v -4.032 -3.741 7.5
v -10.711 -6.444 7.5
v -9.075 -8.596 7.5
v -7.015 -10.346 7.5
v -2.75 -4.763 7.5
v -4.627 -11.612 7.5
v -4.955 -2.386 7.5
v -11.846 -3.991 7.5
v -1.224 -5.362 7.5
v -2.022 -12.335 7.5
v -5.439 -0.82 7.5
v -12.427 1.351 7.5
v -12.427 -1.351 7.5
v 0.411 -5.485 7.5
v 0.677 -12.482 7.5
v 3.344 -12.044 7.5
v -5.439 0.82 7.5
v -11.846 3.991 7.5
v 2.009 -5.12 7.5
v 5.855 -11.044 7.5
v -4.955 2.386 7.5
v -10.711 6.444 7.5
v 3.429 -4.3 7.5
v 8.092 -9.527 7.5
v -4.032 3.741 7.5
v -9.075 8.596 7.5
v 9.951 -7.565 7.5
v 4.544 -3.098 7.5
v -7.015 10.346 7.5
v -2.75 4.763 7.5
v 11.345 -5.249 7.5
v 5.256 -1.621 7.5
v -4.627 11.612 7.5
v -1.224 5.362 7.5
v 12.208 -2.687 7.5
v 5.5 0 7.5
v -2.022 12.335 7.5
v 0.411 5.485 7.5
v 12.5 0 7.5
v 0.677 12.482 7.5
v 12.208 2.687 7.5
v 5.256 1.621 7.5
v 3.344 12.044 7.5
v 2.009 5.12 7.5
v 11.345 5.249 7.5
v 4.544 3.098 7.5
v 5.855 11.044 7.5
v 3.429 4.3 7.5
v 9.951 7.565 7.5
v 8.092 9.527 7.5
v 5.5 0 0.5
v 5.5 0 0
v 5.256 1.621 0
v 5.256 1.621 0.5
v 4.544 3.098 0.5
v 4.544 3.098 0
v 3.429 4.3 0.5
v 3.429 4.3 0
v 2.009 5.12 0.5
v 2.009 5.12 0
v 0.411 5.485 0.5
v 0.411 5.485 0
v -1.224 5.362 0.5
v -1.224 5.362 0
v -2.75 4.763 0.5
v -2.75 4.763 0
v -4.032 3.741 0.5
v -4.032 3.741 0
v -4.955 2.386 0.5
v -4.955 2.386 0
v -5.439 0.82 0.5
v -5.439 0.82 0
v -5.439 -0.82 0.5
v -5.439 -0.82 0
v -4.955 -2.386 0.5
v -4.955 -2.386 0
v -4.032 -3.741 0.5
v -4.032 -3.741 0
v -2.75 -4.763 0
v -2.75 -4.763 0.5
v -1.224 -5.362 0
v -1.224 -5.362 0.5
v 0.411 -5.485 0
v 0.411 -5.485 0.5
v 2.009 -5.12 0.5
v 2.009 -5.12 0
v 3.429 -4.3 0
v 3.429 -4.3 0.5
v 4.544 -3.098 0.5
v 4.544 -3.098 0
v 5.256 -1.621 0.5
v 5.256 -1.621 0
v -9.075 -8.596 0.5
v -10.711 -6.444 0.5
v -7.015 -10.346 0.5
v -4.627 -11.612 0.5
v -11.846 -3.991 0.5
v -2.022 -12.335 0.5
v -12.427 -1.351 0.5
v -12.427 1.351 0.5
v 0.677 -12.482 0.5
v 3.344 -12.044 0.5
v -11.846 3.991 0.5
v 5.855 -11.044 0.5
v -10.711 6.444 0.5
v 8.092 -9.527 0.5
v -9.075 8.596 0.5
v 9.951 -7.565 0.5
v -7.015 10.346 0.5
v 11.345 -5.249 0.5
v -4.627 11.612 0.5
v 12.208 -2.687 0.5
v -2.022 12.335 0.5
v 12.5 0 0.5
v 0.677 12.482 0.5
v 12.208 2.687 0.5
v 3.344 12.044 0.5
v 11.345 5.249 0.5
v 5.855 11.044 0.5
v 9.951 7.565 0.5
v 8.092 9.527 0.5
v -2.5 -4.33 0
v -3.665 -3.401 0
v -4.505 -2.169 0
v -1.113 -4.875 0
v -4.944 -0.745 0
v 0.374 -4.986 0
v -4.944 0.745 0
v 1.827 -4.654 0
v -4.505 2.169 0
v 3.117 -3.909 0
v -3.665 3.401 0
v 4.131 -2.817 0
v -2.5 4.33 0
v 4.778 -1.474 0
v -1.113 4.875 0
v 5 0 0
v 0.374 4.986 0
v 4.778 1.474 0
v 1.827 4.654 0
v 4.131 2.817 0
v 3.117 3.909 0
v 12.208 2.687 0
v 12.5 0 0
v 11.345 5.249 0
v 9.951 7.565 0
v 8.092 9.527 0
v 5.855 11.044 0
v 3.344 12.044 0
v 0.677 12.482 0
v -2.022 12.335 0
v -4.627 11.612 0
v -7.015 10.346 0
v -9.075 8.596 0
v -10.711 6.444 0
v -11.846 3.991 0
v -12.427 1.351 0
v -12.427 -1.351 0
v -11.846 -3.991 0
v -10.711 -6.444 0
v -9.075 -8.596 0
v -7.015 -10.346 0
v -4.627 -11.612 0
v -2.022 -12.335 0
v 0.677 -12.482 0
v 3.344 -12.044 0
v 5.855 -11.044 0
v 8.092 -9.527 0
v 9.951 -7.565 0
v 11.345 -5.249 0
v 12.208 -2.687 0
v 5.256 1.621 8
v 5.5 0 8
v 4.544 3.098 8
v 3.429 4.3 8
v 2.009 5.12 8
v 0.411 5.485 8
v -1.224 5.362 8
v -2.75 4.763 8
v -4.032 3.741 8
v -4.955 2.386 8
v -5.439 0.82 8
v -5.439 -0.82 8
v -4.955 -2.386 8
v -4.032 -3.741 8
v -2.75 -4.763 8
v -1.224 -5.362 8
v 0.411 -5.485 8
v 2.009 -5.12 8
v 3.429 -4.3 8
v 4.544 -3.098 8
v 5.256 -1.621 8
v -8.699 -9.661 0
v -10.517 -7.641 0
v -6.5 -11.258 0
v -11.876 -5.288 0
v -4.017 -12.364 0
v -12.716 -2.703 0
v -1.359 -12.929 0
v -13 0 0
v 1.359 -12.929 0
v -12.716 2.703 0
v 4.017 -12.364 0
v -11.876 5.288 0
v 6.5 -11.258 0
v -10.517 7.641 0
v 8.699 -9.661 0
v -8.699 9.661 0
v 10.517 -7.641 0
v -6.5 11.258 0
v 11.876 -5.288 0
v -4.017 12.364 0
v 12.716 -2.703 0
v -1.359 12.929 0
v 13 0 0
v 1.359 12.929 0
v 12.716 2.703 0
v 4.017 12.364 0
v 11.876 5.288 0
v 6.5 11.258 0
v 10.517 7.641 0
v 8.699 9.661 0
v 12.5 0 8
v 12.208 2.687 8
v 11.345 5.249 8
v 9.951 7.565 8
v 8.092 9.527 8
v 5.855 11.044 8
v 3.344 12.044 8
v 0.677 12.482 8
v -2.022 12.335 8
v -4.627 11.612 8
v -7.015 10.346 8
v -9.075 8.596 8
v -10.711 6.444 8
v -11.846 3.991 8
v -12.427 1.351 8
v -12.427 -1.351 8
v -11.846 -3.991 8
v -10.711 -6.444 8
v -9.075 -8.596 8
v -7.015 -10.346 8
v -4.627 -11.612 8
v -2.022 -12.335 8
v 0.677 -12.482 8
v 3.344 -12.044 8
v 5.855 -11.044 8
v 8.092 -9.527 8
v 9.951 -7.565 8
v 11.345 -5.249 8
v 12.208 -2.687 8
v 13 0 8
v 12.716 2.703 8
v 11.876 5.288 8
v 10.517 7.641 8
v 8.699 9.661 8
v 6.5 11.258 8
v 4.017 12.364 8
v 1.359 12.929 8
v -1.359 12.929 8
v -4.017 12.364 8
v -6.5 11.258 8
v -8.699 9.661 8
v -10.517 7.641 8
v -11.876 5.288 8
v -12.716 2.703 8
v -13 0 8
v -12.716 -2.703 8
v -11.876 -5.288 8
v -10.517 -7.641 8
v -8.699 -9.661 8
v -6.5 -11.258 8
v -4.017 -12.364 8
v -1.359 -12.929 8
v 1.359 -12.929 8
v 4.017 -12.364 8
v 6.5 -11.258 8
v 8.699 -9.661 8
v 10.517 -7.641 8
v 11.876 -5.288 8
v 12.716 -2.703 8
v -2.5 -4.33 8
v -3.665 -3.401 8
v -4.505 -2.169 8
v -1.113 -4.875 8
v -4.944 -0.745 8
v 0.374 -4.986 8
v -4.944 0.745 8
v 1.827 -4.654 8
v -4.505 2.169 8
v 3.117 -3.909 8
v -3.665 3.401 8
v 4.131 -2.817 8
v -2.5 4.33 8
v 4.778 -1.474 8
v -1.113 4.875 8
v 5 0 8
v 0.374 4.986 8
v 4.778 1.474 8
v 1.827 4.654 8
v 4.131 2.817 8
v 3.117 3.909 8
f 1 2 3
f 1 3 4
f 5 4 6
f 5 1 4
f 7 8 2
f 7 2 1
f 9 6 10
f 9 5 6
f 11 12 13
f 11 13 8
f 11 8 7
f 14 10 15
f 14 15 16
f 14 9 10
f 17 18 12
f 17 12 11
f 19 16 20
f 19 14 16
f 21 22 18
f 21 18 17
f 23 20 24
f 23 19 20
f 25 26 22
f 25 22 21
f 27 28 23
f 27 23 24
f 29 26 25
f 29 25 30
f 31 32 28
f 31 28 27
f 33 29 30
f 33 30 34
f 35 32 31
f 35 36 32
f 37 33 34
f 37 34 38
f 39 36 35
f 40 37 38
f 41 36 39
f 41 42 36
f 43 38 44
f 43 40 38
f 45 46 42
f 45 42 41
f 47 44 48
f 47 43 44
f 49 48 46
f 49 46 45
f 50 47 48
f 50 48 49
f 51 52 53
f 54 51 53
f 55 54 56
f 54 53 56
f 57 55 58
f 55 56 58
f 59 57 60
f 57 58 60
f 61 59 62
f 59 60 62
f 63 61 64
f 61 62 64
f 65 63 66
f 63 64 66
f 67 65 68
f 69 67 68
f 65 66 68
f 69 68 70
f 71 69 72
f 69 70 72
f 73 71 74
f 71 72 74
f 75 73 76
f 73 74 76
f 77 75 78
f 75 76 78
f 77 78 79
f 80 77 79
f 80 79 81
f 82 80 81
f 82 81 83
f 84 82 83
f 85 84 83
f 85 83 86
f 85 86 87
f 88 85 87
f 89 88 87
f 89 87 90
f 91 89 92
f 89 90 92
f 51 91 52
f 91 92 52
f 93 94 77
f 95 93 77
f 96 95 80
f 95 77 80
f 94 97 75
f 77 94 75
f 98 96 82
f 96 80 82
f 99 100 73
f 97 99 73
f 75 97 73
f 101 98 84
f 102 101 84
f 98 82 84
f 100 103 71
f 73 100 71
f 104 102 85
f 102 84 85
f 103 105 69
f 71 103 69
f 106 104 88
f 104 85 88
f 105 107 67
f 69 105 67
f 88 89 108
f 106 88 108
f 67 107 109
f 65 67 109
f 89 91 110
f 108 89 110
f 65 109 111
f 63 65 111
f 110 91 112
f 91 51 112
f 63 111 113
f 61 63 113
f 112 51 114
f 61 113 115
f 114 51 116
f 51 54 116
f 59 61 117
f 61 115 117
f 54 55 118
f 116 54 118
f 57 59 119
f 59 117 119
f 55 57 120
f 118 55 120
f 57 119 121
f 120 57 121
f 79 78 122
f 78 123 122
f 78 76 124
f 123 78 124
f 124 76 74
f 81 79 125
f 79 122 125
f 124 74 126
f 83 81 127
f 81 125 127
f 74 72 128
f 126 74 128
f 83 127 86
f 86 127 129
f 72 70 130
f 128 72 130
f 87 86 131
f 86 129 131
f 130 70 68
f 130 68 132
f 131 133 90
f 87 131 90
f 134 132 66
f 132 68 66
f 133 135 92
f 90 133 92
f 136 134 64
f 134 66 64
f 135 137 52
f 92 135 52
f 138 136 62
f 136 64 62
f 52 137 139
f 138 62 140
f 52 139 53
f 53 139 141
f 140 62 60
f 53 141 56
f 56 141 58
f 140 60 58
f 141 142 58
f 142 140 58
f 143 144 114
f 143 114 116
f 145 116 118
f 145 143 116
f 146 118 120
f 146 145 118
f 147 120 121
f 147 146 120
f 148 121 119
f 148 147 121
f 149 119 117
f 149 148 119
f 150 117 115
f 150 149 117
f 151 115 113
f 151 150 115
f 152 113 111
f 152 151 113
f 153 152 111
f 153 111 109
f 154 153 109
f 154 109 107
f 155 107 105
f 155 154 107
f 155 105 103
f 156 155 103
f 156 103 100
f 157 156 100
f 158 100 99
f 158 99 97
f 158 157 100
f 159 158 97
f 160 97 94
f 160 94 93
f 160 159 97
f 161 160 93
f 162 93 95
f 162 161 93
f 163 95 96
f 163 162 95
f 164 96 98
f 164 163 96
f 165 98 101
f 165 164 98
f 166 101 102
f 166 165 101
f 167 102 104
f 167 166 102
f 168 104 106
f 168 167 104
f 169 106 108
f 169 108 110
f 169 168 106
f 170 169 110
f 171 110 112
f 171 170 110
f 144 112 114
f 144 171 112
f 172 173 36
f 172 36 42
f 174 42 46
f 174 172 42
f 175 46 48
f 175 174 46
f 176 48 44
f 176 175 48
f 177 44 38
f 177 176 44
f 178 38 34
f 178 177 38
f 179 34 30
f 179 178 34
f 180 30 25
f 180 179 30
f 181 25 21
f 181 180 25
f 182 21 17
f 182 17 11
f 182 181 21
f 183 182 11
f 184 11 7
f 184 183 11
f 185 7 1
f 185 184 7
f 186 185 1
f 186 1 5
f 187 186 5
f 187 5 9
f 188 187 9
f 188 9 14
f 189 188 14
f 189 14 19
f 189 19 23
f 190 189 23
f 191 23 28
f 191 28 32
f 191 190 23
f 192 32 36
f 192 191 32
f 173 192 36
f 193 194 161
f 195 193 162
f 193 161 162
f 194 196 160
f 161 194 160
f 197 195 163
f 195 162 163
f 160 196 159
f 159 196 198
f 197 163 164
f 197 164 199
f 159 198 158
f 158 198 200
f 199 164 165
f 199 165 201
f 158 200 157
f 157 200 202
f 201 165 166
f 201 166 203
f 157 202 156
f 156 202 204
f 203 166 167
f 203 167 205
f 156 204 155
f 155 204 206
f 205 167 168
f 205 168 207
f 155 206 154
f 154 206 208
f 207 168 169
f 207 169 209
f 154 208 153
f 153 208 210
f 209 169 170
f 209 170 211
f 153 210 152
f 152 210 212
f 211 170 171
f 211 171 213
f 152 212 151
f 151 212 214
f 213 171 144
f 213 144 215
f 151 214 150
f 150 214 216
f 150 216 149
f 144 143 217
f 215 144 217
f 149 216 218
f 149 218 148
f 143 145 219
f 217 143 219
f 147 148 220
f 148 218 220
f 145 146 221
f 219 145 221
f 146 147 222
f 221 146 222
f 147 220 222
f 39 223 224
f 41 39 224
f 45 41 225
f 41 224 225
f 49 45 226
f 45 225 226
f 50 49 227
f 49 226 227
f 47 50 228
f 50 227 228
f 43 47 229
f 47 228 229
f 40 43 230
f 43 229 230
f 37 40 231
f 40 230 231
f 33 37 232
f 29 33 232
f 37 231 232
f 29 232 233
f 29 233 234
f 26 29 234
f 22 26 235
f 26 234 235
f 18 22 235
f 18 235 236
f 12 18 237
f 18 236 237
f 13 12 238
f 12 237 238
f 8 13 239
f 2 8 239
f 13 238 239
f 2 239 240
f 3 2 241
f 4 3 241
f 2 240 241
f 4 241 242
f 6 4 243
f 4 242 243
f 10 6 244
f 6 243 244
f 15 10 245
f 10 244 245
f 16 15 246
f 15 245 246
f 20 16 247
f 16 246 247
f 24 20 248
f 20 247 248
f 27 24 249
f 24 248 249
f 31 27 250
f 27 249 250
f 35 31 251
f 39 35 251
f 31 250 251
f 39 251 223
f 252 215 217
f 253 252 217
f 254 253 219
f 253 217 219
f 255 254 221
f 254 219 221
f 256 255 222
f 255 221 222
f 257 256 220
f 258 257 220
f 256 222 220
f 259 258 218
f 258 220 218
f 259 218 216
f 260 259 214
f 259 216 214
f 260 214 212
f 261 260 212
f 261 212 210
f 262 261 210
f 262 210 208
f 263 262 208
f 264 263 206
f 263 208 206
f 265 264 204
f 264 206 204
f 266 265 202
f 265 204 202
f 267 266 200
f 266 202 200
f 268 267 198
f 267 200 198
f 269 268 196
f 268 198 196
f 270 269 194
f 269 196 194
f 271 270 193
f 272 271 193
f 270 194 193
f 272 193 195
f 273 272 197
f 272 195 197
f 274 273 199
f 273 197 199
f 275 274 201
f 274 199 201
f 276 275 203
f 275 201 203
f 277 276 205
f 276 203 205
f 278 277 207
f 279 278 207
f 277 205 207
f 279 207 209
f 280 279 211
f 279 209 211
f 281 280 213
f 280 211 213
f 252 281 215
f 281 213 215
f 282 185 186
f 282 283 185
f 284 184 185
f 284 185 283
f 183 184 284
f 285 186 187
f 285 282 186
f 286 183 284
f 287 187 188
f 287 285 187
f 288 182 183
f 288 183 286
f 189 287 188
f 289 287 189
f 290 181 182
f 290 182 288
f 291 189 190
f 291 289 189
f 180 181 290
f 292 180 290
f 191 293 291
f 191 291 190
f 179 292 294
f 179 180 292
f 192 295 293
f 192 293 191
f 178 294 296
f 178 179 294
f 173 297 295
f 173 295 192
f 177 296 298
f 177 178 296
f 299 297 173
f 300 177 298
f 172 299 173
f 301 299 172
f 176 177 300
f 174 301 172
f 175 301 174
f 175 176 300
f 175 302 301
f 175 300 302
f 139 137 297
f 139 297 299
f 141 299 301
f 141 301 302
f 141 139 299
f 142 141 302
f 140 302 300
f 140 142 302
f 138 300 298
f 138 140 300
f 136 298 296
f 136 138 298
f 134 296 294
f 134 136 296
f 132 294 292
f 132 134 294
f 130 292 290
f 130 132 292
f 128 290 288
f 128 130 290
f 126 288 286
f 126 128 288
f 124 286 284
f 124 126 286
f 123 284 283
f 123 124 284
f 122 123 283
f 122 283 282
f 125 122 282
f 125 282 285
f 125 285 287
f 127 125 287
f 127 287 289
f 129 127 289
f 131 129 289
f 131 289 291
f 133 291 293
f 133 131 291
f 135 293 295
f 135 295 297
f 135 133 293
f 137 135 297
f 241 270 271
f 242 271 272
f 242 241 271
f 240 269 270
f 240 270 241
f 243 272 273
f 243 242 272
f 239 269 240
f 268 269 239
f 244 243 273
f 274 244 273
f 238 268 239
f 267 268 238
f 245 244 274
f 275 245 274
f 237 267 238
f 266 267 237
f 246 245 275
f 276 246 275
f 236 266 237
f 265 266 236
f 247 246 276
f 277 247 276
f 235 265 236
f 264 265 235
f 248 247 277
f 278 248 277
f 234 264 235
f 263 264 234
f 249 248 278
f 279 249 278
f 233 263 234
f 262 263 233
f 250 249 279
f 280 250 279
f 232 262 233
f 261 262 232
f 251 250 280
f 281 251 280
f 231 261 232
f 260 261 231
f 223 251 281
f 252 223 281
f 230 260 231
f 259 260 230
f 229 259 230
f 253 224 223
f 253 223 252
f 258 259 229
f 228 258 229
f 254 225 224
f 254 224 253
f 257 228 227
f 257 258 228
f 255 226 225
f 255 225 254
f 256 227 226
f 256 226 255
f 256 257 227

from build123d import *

# Parameters (mm, degrees)
SKETCH1_R           = 13
SKETCH1_R_2         = 5
BOSS_EXTRUDE1_DEPTH = 8
SKETCH2_R           = 12.5
SKETCH2_R_2         = 5.5
CUT_EXTRUDE1_DEPTH  = 0.5


with BuildPart() as part:
    # Sketch1 → Boss-Extrude1 (new body)
    with BuildSketch(Plane.XY):
        Circle(SKETCH1_R)
        Circle(SKETCH1_R_2, mode=Mode.SUBTRACT)
    extrude(amount=BOSS_EXTRUDE1_DEPTH)

    # Sketch2 → Cut-Extrude1 (cut)
    with BuildSketch(Plane.XY.offset(8)):
        Circle(SKETCH2_R)
        Circle(SKETCH2_R_2, mode=Mode.SUBTRACT)
    cut_extrude1 = extrude(amount=-CUT_EXTRUDE1_DEPTH, mode=Mode.SUBTRACT)

    # Mirror1: Cut-Extrude1 across plane
    add(cut_extrude1.mirror(Plane(origin=(0, 0, 4), x_dir=(1, 0, 0), z_dir=(0, 0, -1))), mode=Mode.SUBTRACT)


solid = part.part
